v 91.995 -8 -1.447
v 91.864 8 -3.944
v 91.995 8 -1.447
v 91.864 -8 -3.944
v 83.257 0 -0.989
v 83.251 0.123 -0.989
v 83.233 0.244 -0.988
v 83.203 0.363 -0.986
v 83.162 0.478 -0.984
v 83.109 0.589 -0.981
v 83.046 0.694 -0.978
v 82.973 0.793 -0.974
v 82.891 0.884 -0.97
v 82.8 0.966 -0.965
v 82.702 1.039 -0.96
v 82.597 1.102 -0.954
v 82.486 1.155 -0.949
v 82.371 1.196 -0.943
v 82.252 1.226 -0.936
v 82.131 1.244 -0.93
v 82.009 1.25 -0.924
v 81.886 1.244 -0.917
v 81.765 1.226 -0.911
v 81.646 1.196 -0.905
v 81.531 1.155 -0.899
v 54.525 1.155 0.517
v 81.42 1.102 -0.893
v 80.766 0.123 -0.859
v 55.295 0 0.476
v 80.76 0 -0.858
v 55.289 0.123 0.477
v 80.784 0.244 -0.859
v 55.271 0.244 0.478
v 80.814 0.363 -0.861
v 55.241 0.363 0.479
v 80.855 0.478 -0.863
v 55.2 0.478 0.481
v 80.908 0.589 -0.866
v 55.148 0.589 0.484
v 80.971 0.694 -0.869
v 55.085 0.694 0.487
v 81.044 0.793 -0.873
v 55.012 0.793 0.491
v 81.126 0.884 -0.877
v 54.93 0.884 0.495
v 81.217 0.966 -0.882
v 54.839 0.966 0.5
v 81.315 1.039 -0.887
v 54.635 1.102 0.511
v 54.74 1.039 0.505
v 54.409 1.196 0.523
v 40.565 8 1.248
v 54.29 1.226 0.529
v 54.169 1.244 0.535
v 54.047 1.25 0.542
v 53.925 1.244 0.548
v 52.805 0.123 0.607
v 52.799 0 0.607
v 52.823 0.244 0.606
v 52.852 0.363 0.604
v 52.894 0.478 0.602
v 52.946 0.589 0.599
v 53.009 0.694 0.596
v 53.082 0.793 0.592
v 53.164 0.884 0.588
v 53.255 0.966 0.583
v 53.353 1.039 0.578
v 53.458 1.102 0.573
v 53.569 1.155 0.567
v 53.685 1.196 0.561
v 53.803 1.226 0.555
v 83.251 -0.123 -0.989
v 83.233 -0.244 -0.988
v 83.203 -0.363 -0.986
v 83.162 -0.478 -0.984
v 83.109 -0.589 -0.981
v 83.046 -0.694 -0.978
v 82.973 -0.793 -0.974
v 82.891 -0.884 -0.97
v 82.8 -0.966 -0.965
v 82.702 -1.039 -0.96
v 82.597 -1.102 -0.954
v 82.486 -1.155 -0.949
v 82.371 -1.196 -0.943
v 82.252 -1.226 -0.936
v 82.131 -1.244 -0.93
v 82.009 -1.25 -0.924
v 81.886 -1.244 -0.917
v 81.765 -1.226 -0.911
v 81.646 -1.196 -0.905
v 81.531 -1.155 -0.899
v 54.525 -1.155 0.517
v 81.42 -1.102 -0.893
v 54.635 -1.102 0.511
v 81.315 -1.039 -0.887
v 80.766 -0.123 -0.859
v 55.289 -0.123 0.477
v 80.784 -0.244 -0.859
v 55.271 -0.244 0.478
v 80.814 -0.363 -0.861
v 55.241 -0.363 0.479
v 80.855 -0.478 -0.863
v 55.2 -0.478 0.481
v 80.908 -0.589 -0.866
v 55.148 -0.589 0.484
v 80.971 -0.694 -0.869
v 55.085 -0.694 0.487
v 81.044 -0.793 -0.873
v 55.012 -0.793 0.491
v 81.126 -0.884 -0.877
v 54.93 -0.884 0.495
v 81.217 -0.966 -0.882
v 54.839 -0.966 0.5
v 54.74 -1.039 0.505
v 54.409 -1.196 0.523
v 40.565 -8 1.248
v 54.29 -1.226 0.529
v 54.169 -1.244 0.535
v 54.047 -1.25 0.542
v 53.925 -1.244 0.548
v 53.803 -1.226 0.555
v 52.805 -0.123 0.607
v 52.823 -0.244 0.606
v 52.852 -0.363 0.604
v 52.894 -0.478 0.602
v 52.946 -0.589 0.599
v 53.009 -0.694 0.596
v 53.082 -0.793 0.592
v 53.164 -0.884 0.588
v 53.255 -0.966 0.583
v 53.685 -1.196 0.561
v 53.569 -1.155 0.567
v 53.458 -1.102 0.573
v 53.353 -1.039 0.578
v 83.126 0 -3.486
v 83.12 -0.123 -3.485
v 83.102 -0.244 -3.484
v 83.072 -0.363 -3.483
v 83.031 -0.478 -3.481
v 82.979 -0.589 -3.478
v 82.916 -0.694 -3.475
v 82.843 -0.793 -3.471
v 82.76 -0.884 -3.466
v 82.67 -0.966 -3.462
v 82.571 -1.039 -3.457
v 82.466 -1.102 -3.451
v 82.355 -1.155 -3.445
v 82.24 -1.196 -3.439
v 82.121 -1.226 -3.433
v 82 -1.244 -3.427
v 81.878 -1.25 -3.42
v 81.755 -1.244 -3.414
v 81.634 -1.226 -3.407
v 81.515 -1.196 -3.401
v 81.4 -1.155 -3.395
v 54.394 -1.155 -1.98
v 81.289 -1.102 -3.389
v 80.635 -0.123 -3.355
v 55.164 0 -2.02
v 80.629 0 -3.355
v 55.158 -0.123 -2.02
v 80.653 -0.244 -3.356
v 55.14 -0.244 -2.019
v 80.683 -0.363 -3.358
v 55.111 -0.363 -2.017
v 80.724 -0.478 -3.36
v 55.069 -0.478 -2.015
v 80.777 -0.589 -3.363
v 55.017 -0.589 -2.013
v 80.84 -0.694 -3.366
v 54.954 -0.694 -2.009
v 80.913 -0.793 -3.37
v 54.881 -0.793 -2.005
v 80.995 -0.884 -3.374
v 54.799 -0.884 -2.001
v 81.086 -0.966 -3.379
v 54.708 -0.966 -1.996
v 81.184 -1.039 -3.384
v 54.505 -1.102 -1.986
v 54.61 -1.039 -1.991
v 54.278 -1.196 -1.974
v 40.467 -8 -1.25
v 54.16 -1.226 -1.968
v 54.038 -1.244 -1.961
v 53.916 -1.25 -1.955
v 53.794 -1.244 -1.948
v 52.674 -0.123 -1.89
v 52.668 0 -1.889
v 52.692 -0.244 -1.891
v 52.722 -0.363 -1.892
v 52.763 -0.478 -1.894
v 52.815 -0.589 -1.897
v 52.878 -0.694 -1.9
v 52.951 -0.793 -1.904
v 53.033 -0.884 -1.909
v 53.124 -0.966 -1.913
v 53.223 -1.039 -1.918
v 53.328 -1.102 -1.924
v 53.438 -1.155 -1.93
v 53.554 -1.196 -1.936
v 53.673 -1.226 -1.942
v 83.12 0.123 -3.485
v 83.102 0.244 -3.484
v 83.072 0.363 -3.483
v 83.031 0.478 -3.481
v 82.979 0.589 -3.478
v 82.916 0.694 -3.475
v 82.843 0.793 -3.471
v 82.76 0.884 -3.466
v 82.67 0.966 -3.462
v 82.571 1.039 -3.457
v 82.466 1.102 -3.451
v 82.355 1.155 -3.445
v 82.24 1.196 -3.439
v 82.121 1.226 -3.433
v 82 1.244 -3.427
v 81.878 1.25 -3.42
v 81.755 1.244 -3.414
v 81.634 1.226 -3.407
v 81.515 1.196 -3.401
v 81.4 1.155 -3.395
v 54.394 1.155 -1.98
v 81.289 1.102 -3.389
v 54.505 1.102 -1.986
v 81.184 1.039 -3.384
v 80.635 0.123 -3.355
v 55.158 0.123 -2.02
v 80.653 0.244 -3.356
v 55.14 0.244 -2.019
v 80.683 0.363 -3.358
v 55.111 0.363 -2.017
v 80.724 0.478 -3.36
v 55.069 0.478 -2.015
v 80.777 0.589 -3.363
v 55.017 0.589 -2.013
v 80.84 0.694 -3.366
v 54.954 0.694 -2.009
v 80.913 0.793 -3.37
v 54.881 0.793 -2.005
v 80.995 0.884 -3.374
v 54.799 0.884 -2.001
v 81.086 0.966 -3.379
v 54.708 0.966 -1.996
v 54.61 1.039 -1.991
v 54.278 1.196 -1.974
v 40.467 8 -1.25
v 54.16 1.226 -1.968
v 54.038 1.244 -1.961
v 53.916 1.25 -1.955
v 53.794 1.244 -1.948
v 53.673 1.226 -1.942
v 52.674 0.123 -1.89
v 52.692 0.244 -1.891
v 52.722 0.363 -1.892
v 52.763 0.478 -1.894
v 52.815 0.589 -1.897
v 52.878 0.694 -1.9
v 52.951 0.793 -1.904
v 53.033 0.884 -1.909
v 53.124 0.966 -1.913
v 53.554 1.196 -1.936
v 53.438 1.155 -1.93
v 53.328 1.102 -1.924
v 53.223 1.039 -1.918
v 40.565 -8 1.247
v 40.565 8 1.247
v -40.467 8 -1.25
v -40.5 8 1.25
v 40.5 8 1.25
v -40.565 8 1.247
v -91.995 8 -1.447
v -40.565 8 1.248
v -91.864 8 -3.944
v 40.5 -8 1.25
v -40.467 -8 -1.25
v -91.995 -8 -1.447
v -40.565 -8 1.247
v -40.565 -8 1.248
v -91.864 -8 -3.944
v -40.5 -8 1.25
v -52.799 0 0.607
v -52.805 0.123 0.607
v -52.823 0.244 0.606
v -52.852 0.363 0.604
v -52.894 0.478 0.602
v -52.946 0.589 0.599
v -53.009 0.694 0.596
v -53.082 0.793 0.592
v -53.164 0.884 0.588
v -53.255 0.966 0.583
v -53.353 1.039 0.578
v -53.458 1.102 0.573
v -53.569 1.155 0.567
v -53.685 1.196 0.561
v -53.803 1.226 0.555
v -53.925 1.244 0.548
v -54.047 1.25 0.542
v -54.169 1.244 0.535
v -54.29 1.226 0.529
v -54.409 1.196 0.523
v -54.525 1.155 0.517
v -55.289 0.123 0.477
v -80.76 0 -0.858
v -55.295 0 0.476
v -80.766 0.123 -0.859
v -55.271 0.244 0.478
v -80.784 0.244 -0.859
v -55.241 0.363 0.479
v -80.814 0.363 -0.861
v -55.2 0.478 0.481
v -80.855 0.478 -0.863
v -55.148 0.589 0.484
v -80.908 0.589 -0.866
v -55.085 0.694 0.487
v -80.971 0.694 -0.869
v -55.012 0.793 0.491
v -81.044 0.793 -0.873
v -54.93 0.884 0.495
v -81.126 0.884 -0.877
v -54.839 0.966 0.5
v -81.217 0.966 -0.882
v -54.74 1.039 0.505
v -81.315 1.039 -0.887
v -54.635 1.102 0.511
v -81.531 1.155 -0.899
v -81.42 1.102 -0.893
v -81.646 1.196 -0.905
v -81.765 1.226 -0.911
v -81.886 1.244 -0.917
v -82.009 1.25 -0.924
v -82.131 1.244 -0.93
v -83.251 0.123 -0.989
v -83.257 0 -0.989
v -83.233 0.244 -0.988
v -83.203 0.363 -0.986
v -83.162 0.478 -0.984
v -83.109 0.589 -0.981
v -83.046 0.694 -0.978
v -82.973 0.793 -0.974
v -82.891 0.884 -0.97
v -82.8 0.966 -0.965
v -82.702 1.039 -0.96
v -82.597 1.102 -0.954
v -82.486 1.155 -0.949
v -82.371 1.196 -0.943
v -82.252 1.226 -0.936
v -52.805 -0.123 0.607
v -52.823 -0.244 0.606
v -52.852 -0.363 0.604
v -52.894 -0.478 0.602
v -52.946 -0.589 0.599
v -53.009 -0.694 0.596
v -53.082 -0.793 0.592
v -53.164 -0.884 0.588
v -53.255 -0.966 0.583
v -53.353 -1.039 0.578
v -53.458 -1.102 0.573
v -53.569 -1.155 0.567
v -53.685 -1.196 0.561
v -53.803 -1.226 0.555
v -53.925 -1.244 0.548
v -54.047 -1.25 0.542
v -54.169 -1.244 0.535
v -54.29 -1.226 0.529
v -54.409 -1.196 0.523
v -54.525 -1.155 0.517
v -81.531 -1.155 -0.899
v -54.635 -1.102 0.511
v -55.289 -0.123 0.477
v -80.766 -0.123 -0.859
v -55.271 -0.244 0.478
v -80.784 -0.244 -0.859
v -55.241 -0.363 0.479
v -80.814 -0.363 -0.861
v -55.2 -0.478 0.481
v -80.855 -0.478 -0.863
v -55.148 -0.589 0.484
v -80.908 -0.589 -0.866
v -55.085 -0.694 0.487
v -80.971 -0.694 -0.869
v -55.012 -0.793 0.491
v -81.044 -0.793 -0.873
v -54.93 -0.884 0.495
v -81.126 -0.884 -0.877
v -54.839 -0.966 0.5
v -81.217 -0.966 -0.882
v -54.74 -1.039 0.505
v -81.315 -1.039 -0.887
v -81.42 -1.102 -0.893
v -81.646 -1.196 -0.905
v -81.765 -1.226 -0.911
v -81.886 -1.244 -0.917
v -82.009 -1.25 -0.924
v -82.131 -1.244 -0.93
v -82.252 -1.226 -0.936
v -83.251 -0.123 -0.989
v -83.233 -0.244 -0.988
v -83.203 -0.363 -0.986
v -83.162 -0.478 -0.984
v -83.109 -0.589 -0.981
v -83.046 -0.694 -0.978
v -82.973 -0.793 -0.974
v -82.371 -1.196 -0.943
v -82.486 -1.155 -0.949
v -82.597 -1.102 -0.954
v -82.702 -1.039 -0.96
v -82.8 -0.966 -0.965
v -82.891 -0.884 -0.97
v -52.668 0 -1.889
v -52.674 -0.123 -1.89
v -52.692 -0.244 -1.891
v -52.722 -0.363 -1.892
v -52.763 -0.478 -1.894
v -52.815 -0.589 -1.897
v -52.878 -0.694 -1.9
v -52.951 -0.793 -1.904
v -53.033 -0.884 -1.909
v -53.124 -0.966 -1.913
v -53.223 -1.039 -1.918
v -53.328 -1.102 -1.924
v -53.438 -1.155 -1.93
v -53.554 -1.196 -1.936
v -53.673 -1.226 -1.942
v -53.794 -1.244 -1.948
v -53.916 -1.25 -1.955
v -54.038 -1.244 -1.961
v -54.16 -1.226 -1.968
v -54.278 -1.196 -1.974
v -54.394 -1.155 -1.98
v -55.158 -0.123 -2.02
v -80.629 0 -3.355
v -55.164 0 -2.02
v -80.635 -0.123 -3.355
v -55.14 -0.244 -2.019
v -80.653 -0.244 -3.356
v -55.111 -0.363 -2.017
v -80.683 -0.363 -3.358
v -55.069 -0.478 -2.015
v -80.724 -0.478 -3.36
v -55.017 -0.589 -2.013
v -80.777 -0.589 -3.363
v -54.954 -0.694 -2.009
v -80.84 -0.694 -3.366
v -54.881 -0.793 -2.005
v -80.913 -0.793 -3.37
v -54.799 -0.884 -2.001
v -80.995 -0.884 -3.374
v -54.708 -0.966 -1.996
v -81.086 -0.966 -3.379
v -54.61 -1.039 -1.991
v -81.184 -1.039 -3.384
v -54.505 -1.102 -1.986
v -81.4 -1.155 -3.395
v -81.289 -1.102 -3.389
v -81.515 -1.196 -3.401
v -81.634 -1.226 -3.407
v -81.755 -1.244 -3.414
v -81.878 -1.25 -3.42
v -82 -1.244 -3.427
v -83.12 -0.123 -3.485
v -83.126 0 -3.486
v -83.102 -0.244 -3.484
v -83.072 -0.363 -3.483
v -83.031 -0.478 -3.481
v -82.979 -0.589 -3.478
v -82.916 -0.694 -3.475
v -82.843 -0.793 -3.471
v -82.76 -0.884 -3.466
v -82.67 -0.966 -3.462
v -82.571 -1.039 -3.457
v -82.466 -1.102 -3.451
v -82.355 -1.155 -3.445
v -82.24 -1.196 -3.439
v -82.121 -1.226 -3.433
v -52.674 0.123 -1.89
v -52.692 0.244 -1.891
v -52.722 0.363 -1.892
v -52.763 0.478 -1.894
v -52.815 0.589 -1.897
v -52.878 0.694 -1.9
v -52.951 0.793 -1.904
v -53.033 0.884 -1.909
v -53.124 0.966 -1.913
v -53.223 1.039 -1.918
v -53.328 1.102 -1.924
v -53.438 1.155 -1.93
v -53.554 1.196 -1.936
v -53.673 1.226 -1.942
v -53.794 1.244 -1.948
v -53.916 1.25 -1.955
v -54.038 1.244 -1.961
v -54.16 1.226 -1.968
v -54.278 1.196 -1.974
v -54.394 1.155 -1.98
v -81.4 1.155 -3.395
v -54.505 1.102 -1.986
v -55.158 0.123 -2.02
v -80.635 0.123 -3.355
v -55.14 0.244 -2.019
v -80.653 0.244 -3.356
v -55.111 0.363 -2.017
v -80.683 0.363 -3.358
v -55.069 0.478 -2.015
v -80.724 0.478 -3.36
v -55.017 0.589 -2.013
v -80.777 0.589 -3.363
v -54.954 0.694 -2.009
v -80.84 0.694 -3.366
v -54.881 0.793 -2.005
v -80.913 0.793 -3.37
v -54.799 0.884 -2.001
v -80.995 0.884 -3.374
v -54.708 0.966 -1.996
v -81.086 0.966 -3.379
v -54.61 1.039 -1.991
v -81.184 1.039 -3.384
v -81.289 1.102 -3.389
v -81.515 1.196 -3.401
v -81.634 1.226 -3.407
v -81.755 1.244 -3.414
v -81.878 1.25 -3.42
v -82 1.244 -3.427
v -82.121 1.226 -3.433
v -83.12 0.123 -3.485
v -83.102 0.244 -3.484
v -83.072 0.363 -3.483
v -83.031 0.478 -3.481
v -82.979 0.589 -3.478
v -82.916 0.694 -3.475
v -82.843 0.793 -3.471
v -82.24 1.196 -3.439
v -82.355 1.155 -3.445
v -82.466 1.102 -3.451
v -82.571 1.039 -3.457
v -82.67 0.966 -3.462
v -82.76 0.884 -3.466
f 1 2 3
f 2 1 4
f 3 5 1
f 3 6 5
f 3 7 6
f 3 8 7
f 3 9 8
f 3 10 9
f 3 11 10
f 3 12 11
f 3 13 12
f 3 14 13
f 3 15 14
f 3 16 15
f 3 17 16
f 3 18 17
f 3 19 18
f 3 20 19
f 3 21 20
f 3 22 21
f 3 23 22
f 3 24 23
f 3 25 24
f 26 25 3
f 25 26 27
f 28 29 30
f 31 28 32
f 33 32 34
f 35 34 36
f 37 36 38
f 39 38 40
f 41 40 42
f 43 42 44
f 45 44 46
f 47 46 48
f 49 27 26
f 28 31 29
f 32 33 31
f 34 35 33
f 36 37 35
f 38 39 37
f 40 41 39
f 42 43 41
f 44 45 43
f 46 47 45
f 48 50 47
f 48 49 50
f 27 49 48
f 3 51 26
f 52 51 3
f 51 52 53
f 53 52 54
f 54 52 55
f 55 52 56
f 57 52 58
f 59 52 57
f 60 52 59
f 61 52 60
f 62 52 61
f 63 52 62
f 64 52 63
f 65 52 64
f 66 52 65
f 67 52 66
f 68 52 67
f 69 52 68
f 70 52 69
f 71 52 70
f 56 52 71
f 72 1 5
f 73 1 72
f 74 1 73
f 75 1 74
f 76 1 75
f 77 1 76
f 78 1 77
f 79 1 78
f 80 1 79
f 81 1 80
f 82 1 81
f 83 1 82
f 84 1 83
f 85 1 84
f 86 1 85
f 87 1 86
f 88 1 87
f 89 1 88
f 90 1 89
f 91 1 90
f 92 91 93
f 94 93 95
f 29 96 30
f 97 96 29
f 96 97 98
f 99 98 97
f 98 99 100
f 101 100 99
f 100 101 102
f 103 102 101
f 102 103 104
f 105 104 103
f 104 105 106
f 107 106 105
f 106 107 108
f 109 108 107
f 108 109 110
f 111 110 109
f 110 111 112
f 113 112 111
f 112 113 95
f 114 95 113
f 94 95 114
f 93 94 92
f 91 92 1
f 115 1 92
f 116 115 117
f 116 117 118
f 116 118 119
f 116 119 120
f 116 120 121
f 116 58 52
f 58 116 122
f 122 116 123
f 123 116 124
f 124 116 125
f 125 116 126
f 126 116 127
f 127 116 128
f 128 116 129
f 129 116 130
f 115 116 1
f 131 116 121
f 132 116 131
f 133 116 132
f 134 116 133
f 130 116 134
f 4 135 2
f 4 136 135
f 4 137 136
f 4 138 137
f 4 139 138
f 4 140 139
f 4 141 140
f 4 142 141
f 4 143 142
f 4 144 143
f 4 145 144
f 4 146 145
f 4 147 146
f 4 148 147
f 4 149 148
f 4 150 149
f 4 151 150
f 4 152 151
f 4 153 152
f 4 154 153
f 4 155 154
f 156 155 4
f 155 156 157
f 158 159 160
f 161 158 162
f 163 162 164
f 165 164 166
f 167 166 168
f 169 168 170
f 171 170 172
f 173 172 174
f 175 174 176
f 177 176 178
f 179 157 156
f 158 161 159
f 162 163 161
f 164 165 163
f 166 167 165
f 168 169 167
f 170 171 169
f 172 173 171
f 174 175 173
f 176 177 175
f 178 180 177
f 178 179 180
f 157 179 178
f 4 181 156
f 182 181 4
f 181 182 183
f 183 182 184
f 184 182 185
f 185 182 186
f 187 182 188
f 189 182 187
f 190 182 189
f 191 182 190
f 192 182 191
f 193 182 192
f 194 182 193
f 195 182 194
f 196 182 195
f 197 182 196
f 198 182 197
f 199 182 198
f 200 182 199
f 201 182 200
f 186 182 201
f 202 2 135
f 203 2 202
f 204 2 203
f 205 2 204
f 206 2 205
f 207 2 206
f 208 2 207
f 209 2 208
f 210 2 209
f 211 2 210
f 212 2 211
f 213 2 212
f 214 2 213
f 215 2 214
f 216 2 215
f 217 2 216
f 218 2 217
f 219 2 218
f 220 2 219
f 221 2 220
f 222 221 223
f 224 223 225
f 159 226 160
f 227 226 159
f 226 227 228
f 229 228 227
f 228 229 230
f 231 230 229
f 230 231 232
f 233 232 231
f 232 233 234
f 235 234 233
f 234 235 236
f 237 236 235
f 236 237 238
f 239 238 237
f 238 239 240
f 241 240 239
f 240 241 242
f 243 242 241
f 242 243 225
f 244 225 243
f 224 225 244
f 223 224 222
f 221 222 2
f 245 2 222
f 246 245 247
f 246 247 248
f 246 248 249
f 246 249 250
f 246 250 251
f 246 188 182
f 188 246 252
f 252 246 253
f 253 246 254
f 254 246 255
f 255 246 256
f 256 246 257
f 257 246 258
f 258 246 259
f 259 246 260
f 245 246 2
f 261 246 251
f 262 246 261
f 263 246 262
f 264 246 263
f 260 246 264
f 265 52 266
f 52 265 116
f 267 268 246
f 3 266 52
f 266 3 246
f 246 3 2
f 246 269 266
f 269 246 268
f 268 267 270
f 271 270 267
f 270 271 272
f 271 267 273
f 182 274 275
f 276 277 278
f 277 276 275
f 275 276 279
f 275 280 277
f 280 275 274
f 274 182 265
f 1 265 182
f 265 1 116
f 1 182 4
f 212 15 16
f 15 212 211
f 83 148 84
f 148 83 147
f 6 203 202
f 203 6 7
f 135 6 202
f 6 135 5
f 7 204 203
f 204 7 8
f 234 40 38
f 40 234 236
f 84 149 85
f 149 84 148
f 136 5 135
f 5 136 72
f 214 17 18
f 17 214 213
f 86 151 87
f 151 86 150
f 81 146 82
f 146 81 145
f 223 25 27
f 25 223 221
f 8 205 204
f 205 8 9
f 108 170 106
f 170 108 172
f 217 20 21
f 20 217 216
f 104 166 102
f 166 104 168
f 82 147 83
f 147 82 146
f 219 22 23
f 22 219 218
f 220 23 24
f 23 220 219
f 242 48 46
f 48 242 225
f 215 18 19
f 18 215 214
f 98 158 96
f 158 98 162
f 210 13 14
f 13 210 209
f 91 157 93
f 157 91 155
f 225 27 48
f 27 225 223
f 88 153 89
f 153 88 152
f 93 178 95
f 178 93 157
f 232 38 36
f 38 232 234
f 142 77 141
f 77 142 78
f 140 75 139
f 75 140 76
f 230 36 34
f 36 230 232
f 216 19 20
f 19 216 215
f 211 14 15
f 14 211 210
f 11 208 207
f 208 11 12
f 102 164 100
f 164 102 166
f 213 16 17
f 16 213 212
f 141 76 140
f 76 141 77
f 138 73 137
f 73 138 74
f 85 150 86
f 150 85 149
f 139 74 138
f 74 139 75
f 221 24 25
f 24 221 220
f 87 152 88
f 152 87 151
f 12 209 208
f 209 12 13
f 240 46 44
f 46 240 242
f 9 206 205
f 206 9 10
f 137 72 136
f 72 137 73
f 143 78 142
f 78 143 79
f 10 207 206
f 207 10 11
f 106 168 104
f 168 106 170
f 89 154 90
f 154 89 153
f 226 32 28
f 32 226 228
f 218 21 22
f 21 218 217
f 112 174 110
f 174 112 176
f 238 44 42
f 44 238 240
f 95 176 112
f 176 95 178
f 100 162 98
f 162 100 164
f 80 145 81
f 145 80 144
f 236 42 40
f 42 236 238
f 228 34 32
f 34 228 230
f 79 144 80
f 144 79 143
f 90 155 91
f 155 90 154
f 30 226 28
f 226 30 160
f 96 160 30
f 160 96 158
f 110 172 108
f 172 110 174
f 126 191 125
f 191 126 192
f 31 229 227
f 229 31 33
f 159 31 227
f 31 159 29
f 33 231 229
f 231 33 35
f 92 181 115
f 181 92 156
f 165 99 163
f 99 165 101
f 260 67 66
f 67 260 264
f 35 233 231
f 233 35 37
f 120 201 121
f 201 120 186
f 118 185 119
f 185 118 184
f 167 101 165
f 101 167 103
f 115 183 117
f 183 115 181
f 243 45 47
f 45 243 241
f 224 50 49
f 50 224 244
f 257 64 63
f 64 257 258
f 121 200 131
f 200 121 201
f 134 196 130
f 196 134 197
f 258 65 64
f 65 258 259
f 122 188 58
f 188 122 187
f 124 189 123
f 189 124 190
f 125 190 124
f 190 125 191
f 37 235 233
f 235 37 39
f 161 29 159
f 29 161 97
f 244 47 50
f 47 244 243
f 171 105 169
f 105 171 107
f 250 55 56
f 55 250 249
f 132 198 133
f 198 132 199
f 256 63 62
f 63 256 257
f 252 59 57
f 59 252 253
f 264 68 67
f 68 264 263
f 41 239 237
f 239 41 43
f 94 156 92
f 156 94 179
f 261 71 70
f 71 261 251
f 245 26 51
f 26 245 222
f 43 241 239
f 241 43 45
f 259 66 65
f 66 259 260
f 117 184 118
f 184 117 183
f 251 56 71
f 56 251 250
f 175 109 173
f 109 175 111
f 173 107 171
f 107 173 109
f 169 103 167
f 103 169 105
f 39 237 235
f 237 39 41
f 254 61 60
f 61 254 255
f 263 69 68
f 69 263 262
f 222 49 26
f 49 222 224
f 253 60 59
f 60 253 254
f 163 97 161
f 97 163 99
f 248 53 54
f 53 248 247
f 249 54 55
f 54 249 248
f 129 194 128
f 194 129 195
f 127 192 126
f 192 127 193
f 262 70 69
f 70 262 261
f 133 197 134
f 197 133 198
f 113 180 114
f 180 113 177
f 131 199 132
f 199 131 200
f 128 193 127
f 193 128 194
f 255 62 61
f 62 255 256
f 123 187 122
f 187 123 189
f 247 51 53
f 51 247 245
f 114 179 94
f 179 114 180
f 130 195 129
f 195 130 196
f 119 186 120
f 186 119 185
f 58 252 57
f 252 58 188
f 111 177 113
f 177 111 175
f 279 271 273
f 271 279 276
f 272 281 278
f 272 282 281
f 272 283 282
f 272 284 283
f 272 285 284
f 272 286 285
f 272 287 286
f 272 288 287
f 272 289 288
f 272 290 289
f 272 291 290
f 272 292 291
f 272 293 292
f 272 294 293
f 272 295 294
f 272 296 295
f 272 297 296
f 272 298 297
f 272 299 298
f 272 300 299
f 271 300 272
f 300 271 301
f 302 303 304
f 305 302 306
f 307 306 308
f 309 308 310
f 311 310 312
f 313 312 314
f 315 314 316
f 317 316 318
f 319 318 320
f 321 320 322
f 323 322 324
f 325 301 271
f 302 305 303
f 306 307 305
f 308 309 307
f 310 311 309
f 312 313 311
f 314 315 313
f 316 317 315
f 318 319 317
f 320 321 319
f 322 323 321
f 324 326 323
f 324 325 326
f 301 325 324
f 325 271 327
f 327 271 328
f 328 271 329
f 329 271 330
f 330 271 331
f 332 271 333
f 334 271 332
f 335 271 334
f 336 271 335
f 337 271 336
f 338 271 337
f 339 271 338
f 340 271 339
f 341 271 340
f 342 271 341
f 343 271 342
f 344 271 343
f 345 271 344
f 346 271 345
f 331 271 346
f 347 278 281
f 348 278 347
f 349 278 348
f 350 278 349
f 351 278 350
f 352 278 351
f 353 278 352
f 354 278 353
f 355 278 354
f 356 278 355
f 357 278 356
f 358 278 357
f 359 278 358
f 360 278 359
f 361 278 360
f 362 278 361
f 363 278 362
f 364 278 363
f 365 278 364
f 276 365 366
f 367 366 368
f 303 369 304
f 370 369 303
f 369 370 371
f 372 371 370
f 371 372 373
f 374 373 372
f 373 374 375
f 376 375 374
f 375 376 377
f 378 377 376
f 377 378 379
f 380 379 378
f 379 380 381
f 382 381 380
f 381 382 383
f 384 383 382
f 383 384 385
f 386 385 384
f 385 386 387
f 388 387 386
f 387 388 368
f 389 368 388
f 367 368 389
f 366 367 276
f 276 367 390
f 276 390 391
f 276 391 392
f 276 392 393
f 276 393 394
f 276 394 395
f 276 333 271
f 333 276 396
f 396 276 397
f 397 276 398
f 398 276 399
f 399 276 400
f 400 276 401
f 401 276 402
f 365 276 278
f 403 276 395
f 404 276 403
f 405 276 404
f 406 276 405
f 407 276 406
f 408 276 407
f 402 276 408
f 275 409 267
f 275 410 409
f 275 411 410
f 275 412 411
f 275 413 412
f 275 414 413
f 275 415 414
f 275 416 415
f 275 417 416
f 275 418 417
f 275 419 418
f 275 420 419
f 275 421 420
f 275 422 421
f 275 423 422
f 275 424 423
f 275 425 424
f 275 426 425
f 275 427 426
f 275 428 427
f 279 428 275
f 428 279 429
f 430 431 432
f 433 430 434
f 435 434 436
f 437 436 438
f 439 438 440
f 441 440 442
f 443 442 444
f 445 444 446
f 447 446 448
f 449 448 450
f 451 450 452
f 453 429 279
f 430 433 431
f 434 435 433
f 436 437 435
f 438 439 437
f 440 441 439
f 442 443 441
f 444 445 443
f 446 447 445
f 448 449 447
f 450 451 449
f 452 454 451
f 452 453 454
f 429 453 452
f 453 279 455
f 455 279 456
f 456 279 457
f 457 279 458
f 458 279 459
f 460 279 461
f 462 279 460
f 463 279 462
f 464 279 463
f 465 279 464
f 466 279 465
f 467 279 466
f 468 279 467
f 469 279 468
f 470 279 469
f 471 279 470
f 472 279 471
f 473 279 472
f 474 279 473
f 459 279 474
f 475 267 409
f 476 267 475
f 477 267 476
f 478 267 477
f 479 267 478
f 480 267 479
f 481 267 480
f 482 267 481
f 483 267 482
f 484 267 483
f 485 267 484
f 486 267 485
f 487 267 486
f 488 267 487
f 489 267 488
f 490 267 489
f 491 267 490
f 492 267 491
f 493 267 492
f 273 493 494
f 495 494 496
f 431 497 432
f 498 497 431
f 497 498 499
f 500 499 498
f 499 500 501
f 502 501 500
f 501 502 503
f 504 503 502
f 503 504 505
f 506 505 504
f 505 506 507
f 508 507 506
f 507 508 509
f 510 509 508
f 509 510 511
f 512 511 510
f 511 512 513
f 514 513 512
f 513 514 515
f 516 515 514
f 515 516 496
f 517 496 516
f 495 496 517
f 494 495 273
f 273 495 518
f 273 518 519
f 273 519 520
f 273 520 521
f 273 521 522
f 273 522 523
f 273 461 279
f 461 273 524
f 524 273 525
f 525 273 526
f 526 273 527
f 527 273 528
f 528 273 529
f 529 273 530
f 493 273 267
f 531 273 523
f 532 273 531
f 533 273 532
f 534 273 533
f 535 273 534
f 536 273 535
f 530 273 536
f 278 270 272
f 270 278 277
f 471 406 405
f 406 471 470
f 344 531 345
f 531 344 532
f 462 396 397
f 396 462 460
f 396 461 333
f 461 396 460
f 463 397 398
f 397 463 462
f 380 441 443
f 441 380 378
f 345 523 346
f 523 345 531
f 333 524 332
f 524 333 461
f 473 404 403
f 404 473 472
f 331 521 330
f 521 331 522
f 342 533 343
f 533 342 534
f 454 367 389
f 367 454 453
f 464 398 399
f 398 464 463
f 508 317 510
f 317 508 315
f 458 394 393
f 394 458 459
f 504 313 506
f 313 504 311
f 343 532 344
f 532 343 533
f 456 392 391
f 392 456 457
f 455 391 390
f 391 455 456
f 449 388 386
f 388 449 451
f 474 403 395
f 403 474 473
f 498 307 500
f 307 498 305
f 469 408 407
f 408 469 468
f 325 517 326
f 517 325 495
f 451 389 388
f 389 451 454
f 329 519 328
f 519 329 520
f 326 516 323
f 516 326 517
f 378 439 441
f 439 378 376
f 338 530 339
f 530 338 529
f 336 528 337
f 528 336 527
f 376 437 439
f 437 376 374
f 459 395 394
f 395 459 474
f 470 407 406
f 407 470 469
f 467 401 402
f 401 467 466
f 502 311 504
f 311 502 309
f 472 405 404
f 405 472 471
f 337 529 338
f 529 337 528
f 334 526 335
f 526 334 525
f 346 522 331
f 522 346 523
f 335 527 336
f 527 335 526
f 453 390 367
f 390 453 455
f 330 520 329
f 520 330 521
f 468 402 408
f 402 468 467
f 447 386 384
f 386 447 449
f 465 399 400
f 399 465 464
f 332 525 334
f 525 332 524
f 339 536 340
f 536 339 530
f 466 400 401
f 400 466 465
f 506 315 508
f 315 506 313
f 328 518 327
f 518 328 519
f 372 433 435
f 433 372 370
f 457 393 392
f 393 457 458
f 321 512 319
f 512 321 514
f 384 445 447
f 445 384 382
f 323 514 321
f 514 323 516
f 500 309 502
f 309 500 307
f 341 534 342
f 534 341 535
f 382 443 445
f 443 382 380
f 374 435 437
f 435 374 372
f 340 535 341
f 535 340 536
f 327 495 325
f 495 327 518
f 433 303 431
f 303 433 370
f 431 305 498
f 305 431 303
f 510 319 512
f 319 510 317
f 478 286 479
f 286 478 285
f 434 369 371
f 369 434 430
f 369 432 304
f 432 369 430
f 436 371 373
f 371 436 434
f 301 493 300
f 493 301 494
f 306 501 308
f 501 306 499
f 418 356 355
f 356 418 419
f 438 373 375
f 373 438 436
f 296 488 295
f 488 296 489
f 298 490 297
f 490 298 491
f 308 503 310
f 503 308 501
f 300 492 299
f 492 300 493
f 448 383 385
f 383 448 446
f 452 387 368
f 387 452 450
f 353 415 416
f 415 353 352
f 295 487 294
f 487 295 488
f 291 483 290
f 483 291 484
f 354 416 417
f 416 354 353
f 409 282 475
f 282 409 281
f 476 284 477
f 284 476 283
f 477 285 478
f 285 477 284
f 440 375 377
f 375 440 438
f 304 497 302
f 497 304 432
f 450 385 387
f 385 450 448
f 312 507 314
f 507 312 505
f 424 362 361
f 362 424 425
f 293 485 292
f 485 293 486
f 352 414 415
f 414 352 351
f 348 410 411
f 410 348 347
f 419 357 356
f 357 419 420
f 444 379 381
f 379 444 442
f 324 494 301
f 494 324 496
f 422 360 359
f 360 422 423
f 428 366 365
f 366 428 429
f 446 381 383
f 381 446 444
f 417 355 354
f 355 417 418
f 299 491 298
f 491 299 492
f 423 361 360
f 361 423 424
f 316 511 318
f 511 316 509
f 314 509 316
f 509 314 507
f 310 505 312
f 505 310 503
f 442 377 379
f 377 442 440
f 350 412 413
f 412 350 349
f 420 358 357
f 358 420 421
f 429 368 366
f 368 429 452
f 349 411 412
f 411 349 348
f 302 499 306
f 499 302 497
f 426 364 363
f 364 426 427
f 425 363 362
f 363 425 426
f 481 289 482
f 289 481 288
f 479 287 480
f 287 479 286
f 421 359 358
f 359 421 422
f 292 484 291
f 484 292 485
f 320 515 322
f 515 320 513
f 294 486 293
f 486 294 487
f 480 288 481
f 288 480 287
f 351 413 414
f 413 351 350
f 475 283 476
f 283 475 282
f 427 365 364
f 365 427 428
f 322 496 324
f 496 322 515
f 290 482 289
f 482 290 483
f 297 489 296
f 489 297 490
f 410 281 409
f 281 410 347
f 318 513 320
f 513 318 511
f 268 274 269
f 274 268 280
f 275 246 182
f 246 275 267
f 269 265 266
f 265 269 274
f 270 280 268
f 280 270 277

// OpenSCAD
dihedral = 6;

length = 184;
centerLen = 81;
endLen = (length-centerLen)/2;

width = 16;
thick = 2.5;
holeFromEnd = 10;
holeSep = 28;
holeDia = 2.5;

$fn = 64;

Joiner2();

//JoinerHalf();

//JoinerEnd();

module JoinerEnd()
{
translate([-endLen/2,0,0])
rotate([0,dihedral/2,0])
translate([endLen/2,0,0])
difference()
   {
      cube([endLen, width, thick],true);
      translate([endLen/2-holeFromEnd, 0, -thick])
         cylinder(h = 2*thick, d = holeDia);
      translate([endLen/2-holeFromEnd-holeSep, 0, -thick])
         cylinder(h = 2*thick, d = holeDia);
   }
}

module Joiner2()
{

translate([centerLen/2+endLen/2,0,0])
   rotate([0,0,0])
      JoinerEnd();

cube([centerLen, width, thick],true);

translate([centerLen/2,width/2,0])
   rotate([90,0,0]) cylinder(h = width, r = thick/2);
translate([-centerLen/2,width/2,0])
   rotate([90,0,0]) cylinder(h = width, r = thick/2);


translate([-(centerLen/2+endLen/2),0,0])
      rotate([0,0,180])
      JoinerEnd();

}


module JoinerHalf()
{
difference()
   {
   cube([length/2, width, thick],true);
   translate([length/4-holeFromEnd, 0, -thick])
      cylinder(h = 2*thick, d = holeDia);
   }
}

module Joiner()
{

translate([length/4,0,0])
   rotate([0,0,0])
      JoinerHalf();

difference()
   {
   //rotate([90,0,0]) cylinder(h = width, r = thick/2+(0*thick+length/2)*sin(dihedral));
   //rotate([90,0,0]) cylinder(h = width, r = -thick/2+(0*thick+length/2)*sin(dihedral));
   }

translate([0,width/2,0])
   rotate([90,0,0]) cylinder(h = width, r = thick/2);

rotate([0,-dihedral,0])
translate([-length/4,0,0])
      rotate([0,0,180])
      JoinerHalf();

}
